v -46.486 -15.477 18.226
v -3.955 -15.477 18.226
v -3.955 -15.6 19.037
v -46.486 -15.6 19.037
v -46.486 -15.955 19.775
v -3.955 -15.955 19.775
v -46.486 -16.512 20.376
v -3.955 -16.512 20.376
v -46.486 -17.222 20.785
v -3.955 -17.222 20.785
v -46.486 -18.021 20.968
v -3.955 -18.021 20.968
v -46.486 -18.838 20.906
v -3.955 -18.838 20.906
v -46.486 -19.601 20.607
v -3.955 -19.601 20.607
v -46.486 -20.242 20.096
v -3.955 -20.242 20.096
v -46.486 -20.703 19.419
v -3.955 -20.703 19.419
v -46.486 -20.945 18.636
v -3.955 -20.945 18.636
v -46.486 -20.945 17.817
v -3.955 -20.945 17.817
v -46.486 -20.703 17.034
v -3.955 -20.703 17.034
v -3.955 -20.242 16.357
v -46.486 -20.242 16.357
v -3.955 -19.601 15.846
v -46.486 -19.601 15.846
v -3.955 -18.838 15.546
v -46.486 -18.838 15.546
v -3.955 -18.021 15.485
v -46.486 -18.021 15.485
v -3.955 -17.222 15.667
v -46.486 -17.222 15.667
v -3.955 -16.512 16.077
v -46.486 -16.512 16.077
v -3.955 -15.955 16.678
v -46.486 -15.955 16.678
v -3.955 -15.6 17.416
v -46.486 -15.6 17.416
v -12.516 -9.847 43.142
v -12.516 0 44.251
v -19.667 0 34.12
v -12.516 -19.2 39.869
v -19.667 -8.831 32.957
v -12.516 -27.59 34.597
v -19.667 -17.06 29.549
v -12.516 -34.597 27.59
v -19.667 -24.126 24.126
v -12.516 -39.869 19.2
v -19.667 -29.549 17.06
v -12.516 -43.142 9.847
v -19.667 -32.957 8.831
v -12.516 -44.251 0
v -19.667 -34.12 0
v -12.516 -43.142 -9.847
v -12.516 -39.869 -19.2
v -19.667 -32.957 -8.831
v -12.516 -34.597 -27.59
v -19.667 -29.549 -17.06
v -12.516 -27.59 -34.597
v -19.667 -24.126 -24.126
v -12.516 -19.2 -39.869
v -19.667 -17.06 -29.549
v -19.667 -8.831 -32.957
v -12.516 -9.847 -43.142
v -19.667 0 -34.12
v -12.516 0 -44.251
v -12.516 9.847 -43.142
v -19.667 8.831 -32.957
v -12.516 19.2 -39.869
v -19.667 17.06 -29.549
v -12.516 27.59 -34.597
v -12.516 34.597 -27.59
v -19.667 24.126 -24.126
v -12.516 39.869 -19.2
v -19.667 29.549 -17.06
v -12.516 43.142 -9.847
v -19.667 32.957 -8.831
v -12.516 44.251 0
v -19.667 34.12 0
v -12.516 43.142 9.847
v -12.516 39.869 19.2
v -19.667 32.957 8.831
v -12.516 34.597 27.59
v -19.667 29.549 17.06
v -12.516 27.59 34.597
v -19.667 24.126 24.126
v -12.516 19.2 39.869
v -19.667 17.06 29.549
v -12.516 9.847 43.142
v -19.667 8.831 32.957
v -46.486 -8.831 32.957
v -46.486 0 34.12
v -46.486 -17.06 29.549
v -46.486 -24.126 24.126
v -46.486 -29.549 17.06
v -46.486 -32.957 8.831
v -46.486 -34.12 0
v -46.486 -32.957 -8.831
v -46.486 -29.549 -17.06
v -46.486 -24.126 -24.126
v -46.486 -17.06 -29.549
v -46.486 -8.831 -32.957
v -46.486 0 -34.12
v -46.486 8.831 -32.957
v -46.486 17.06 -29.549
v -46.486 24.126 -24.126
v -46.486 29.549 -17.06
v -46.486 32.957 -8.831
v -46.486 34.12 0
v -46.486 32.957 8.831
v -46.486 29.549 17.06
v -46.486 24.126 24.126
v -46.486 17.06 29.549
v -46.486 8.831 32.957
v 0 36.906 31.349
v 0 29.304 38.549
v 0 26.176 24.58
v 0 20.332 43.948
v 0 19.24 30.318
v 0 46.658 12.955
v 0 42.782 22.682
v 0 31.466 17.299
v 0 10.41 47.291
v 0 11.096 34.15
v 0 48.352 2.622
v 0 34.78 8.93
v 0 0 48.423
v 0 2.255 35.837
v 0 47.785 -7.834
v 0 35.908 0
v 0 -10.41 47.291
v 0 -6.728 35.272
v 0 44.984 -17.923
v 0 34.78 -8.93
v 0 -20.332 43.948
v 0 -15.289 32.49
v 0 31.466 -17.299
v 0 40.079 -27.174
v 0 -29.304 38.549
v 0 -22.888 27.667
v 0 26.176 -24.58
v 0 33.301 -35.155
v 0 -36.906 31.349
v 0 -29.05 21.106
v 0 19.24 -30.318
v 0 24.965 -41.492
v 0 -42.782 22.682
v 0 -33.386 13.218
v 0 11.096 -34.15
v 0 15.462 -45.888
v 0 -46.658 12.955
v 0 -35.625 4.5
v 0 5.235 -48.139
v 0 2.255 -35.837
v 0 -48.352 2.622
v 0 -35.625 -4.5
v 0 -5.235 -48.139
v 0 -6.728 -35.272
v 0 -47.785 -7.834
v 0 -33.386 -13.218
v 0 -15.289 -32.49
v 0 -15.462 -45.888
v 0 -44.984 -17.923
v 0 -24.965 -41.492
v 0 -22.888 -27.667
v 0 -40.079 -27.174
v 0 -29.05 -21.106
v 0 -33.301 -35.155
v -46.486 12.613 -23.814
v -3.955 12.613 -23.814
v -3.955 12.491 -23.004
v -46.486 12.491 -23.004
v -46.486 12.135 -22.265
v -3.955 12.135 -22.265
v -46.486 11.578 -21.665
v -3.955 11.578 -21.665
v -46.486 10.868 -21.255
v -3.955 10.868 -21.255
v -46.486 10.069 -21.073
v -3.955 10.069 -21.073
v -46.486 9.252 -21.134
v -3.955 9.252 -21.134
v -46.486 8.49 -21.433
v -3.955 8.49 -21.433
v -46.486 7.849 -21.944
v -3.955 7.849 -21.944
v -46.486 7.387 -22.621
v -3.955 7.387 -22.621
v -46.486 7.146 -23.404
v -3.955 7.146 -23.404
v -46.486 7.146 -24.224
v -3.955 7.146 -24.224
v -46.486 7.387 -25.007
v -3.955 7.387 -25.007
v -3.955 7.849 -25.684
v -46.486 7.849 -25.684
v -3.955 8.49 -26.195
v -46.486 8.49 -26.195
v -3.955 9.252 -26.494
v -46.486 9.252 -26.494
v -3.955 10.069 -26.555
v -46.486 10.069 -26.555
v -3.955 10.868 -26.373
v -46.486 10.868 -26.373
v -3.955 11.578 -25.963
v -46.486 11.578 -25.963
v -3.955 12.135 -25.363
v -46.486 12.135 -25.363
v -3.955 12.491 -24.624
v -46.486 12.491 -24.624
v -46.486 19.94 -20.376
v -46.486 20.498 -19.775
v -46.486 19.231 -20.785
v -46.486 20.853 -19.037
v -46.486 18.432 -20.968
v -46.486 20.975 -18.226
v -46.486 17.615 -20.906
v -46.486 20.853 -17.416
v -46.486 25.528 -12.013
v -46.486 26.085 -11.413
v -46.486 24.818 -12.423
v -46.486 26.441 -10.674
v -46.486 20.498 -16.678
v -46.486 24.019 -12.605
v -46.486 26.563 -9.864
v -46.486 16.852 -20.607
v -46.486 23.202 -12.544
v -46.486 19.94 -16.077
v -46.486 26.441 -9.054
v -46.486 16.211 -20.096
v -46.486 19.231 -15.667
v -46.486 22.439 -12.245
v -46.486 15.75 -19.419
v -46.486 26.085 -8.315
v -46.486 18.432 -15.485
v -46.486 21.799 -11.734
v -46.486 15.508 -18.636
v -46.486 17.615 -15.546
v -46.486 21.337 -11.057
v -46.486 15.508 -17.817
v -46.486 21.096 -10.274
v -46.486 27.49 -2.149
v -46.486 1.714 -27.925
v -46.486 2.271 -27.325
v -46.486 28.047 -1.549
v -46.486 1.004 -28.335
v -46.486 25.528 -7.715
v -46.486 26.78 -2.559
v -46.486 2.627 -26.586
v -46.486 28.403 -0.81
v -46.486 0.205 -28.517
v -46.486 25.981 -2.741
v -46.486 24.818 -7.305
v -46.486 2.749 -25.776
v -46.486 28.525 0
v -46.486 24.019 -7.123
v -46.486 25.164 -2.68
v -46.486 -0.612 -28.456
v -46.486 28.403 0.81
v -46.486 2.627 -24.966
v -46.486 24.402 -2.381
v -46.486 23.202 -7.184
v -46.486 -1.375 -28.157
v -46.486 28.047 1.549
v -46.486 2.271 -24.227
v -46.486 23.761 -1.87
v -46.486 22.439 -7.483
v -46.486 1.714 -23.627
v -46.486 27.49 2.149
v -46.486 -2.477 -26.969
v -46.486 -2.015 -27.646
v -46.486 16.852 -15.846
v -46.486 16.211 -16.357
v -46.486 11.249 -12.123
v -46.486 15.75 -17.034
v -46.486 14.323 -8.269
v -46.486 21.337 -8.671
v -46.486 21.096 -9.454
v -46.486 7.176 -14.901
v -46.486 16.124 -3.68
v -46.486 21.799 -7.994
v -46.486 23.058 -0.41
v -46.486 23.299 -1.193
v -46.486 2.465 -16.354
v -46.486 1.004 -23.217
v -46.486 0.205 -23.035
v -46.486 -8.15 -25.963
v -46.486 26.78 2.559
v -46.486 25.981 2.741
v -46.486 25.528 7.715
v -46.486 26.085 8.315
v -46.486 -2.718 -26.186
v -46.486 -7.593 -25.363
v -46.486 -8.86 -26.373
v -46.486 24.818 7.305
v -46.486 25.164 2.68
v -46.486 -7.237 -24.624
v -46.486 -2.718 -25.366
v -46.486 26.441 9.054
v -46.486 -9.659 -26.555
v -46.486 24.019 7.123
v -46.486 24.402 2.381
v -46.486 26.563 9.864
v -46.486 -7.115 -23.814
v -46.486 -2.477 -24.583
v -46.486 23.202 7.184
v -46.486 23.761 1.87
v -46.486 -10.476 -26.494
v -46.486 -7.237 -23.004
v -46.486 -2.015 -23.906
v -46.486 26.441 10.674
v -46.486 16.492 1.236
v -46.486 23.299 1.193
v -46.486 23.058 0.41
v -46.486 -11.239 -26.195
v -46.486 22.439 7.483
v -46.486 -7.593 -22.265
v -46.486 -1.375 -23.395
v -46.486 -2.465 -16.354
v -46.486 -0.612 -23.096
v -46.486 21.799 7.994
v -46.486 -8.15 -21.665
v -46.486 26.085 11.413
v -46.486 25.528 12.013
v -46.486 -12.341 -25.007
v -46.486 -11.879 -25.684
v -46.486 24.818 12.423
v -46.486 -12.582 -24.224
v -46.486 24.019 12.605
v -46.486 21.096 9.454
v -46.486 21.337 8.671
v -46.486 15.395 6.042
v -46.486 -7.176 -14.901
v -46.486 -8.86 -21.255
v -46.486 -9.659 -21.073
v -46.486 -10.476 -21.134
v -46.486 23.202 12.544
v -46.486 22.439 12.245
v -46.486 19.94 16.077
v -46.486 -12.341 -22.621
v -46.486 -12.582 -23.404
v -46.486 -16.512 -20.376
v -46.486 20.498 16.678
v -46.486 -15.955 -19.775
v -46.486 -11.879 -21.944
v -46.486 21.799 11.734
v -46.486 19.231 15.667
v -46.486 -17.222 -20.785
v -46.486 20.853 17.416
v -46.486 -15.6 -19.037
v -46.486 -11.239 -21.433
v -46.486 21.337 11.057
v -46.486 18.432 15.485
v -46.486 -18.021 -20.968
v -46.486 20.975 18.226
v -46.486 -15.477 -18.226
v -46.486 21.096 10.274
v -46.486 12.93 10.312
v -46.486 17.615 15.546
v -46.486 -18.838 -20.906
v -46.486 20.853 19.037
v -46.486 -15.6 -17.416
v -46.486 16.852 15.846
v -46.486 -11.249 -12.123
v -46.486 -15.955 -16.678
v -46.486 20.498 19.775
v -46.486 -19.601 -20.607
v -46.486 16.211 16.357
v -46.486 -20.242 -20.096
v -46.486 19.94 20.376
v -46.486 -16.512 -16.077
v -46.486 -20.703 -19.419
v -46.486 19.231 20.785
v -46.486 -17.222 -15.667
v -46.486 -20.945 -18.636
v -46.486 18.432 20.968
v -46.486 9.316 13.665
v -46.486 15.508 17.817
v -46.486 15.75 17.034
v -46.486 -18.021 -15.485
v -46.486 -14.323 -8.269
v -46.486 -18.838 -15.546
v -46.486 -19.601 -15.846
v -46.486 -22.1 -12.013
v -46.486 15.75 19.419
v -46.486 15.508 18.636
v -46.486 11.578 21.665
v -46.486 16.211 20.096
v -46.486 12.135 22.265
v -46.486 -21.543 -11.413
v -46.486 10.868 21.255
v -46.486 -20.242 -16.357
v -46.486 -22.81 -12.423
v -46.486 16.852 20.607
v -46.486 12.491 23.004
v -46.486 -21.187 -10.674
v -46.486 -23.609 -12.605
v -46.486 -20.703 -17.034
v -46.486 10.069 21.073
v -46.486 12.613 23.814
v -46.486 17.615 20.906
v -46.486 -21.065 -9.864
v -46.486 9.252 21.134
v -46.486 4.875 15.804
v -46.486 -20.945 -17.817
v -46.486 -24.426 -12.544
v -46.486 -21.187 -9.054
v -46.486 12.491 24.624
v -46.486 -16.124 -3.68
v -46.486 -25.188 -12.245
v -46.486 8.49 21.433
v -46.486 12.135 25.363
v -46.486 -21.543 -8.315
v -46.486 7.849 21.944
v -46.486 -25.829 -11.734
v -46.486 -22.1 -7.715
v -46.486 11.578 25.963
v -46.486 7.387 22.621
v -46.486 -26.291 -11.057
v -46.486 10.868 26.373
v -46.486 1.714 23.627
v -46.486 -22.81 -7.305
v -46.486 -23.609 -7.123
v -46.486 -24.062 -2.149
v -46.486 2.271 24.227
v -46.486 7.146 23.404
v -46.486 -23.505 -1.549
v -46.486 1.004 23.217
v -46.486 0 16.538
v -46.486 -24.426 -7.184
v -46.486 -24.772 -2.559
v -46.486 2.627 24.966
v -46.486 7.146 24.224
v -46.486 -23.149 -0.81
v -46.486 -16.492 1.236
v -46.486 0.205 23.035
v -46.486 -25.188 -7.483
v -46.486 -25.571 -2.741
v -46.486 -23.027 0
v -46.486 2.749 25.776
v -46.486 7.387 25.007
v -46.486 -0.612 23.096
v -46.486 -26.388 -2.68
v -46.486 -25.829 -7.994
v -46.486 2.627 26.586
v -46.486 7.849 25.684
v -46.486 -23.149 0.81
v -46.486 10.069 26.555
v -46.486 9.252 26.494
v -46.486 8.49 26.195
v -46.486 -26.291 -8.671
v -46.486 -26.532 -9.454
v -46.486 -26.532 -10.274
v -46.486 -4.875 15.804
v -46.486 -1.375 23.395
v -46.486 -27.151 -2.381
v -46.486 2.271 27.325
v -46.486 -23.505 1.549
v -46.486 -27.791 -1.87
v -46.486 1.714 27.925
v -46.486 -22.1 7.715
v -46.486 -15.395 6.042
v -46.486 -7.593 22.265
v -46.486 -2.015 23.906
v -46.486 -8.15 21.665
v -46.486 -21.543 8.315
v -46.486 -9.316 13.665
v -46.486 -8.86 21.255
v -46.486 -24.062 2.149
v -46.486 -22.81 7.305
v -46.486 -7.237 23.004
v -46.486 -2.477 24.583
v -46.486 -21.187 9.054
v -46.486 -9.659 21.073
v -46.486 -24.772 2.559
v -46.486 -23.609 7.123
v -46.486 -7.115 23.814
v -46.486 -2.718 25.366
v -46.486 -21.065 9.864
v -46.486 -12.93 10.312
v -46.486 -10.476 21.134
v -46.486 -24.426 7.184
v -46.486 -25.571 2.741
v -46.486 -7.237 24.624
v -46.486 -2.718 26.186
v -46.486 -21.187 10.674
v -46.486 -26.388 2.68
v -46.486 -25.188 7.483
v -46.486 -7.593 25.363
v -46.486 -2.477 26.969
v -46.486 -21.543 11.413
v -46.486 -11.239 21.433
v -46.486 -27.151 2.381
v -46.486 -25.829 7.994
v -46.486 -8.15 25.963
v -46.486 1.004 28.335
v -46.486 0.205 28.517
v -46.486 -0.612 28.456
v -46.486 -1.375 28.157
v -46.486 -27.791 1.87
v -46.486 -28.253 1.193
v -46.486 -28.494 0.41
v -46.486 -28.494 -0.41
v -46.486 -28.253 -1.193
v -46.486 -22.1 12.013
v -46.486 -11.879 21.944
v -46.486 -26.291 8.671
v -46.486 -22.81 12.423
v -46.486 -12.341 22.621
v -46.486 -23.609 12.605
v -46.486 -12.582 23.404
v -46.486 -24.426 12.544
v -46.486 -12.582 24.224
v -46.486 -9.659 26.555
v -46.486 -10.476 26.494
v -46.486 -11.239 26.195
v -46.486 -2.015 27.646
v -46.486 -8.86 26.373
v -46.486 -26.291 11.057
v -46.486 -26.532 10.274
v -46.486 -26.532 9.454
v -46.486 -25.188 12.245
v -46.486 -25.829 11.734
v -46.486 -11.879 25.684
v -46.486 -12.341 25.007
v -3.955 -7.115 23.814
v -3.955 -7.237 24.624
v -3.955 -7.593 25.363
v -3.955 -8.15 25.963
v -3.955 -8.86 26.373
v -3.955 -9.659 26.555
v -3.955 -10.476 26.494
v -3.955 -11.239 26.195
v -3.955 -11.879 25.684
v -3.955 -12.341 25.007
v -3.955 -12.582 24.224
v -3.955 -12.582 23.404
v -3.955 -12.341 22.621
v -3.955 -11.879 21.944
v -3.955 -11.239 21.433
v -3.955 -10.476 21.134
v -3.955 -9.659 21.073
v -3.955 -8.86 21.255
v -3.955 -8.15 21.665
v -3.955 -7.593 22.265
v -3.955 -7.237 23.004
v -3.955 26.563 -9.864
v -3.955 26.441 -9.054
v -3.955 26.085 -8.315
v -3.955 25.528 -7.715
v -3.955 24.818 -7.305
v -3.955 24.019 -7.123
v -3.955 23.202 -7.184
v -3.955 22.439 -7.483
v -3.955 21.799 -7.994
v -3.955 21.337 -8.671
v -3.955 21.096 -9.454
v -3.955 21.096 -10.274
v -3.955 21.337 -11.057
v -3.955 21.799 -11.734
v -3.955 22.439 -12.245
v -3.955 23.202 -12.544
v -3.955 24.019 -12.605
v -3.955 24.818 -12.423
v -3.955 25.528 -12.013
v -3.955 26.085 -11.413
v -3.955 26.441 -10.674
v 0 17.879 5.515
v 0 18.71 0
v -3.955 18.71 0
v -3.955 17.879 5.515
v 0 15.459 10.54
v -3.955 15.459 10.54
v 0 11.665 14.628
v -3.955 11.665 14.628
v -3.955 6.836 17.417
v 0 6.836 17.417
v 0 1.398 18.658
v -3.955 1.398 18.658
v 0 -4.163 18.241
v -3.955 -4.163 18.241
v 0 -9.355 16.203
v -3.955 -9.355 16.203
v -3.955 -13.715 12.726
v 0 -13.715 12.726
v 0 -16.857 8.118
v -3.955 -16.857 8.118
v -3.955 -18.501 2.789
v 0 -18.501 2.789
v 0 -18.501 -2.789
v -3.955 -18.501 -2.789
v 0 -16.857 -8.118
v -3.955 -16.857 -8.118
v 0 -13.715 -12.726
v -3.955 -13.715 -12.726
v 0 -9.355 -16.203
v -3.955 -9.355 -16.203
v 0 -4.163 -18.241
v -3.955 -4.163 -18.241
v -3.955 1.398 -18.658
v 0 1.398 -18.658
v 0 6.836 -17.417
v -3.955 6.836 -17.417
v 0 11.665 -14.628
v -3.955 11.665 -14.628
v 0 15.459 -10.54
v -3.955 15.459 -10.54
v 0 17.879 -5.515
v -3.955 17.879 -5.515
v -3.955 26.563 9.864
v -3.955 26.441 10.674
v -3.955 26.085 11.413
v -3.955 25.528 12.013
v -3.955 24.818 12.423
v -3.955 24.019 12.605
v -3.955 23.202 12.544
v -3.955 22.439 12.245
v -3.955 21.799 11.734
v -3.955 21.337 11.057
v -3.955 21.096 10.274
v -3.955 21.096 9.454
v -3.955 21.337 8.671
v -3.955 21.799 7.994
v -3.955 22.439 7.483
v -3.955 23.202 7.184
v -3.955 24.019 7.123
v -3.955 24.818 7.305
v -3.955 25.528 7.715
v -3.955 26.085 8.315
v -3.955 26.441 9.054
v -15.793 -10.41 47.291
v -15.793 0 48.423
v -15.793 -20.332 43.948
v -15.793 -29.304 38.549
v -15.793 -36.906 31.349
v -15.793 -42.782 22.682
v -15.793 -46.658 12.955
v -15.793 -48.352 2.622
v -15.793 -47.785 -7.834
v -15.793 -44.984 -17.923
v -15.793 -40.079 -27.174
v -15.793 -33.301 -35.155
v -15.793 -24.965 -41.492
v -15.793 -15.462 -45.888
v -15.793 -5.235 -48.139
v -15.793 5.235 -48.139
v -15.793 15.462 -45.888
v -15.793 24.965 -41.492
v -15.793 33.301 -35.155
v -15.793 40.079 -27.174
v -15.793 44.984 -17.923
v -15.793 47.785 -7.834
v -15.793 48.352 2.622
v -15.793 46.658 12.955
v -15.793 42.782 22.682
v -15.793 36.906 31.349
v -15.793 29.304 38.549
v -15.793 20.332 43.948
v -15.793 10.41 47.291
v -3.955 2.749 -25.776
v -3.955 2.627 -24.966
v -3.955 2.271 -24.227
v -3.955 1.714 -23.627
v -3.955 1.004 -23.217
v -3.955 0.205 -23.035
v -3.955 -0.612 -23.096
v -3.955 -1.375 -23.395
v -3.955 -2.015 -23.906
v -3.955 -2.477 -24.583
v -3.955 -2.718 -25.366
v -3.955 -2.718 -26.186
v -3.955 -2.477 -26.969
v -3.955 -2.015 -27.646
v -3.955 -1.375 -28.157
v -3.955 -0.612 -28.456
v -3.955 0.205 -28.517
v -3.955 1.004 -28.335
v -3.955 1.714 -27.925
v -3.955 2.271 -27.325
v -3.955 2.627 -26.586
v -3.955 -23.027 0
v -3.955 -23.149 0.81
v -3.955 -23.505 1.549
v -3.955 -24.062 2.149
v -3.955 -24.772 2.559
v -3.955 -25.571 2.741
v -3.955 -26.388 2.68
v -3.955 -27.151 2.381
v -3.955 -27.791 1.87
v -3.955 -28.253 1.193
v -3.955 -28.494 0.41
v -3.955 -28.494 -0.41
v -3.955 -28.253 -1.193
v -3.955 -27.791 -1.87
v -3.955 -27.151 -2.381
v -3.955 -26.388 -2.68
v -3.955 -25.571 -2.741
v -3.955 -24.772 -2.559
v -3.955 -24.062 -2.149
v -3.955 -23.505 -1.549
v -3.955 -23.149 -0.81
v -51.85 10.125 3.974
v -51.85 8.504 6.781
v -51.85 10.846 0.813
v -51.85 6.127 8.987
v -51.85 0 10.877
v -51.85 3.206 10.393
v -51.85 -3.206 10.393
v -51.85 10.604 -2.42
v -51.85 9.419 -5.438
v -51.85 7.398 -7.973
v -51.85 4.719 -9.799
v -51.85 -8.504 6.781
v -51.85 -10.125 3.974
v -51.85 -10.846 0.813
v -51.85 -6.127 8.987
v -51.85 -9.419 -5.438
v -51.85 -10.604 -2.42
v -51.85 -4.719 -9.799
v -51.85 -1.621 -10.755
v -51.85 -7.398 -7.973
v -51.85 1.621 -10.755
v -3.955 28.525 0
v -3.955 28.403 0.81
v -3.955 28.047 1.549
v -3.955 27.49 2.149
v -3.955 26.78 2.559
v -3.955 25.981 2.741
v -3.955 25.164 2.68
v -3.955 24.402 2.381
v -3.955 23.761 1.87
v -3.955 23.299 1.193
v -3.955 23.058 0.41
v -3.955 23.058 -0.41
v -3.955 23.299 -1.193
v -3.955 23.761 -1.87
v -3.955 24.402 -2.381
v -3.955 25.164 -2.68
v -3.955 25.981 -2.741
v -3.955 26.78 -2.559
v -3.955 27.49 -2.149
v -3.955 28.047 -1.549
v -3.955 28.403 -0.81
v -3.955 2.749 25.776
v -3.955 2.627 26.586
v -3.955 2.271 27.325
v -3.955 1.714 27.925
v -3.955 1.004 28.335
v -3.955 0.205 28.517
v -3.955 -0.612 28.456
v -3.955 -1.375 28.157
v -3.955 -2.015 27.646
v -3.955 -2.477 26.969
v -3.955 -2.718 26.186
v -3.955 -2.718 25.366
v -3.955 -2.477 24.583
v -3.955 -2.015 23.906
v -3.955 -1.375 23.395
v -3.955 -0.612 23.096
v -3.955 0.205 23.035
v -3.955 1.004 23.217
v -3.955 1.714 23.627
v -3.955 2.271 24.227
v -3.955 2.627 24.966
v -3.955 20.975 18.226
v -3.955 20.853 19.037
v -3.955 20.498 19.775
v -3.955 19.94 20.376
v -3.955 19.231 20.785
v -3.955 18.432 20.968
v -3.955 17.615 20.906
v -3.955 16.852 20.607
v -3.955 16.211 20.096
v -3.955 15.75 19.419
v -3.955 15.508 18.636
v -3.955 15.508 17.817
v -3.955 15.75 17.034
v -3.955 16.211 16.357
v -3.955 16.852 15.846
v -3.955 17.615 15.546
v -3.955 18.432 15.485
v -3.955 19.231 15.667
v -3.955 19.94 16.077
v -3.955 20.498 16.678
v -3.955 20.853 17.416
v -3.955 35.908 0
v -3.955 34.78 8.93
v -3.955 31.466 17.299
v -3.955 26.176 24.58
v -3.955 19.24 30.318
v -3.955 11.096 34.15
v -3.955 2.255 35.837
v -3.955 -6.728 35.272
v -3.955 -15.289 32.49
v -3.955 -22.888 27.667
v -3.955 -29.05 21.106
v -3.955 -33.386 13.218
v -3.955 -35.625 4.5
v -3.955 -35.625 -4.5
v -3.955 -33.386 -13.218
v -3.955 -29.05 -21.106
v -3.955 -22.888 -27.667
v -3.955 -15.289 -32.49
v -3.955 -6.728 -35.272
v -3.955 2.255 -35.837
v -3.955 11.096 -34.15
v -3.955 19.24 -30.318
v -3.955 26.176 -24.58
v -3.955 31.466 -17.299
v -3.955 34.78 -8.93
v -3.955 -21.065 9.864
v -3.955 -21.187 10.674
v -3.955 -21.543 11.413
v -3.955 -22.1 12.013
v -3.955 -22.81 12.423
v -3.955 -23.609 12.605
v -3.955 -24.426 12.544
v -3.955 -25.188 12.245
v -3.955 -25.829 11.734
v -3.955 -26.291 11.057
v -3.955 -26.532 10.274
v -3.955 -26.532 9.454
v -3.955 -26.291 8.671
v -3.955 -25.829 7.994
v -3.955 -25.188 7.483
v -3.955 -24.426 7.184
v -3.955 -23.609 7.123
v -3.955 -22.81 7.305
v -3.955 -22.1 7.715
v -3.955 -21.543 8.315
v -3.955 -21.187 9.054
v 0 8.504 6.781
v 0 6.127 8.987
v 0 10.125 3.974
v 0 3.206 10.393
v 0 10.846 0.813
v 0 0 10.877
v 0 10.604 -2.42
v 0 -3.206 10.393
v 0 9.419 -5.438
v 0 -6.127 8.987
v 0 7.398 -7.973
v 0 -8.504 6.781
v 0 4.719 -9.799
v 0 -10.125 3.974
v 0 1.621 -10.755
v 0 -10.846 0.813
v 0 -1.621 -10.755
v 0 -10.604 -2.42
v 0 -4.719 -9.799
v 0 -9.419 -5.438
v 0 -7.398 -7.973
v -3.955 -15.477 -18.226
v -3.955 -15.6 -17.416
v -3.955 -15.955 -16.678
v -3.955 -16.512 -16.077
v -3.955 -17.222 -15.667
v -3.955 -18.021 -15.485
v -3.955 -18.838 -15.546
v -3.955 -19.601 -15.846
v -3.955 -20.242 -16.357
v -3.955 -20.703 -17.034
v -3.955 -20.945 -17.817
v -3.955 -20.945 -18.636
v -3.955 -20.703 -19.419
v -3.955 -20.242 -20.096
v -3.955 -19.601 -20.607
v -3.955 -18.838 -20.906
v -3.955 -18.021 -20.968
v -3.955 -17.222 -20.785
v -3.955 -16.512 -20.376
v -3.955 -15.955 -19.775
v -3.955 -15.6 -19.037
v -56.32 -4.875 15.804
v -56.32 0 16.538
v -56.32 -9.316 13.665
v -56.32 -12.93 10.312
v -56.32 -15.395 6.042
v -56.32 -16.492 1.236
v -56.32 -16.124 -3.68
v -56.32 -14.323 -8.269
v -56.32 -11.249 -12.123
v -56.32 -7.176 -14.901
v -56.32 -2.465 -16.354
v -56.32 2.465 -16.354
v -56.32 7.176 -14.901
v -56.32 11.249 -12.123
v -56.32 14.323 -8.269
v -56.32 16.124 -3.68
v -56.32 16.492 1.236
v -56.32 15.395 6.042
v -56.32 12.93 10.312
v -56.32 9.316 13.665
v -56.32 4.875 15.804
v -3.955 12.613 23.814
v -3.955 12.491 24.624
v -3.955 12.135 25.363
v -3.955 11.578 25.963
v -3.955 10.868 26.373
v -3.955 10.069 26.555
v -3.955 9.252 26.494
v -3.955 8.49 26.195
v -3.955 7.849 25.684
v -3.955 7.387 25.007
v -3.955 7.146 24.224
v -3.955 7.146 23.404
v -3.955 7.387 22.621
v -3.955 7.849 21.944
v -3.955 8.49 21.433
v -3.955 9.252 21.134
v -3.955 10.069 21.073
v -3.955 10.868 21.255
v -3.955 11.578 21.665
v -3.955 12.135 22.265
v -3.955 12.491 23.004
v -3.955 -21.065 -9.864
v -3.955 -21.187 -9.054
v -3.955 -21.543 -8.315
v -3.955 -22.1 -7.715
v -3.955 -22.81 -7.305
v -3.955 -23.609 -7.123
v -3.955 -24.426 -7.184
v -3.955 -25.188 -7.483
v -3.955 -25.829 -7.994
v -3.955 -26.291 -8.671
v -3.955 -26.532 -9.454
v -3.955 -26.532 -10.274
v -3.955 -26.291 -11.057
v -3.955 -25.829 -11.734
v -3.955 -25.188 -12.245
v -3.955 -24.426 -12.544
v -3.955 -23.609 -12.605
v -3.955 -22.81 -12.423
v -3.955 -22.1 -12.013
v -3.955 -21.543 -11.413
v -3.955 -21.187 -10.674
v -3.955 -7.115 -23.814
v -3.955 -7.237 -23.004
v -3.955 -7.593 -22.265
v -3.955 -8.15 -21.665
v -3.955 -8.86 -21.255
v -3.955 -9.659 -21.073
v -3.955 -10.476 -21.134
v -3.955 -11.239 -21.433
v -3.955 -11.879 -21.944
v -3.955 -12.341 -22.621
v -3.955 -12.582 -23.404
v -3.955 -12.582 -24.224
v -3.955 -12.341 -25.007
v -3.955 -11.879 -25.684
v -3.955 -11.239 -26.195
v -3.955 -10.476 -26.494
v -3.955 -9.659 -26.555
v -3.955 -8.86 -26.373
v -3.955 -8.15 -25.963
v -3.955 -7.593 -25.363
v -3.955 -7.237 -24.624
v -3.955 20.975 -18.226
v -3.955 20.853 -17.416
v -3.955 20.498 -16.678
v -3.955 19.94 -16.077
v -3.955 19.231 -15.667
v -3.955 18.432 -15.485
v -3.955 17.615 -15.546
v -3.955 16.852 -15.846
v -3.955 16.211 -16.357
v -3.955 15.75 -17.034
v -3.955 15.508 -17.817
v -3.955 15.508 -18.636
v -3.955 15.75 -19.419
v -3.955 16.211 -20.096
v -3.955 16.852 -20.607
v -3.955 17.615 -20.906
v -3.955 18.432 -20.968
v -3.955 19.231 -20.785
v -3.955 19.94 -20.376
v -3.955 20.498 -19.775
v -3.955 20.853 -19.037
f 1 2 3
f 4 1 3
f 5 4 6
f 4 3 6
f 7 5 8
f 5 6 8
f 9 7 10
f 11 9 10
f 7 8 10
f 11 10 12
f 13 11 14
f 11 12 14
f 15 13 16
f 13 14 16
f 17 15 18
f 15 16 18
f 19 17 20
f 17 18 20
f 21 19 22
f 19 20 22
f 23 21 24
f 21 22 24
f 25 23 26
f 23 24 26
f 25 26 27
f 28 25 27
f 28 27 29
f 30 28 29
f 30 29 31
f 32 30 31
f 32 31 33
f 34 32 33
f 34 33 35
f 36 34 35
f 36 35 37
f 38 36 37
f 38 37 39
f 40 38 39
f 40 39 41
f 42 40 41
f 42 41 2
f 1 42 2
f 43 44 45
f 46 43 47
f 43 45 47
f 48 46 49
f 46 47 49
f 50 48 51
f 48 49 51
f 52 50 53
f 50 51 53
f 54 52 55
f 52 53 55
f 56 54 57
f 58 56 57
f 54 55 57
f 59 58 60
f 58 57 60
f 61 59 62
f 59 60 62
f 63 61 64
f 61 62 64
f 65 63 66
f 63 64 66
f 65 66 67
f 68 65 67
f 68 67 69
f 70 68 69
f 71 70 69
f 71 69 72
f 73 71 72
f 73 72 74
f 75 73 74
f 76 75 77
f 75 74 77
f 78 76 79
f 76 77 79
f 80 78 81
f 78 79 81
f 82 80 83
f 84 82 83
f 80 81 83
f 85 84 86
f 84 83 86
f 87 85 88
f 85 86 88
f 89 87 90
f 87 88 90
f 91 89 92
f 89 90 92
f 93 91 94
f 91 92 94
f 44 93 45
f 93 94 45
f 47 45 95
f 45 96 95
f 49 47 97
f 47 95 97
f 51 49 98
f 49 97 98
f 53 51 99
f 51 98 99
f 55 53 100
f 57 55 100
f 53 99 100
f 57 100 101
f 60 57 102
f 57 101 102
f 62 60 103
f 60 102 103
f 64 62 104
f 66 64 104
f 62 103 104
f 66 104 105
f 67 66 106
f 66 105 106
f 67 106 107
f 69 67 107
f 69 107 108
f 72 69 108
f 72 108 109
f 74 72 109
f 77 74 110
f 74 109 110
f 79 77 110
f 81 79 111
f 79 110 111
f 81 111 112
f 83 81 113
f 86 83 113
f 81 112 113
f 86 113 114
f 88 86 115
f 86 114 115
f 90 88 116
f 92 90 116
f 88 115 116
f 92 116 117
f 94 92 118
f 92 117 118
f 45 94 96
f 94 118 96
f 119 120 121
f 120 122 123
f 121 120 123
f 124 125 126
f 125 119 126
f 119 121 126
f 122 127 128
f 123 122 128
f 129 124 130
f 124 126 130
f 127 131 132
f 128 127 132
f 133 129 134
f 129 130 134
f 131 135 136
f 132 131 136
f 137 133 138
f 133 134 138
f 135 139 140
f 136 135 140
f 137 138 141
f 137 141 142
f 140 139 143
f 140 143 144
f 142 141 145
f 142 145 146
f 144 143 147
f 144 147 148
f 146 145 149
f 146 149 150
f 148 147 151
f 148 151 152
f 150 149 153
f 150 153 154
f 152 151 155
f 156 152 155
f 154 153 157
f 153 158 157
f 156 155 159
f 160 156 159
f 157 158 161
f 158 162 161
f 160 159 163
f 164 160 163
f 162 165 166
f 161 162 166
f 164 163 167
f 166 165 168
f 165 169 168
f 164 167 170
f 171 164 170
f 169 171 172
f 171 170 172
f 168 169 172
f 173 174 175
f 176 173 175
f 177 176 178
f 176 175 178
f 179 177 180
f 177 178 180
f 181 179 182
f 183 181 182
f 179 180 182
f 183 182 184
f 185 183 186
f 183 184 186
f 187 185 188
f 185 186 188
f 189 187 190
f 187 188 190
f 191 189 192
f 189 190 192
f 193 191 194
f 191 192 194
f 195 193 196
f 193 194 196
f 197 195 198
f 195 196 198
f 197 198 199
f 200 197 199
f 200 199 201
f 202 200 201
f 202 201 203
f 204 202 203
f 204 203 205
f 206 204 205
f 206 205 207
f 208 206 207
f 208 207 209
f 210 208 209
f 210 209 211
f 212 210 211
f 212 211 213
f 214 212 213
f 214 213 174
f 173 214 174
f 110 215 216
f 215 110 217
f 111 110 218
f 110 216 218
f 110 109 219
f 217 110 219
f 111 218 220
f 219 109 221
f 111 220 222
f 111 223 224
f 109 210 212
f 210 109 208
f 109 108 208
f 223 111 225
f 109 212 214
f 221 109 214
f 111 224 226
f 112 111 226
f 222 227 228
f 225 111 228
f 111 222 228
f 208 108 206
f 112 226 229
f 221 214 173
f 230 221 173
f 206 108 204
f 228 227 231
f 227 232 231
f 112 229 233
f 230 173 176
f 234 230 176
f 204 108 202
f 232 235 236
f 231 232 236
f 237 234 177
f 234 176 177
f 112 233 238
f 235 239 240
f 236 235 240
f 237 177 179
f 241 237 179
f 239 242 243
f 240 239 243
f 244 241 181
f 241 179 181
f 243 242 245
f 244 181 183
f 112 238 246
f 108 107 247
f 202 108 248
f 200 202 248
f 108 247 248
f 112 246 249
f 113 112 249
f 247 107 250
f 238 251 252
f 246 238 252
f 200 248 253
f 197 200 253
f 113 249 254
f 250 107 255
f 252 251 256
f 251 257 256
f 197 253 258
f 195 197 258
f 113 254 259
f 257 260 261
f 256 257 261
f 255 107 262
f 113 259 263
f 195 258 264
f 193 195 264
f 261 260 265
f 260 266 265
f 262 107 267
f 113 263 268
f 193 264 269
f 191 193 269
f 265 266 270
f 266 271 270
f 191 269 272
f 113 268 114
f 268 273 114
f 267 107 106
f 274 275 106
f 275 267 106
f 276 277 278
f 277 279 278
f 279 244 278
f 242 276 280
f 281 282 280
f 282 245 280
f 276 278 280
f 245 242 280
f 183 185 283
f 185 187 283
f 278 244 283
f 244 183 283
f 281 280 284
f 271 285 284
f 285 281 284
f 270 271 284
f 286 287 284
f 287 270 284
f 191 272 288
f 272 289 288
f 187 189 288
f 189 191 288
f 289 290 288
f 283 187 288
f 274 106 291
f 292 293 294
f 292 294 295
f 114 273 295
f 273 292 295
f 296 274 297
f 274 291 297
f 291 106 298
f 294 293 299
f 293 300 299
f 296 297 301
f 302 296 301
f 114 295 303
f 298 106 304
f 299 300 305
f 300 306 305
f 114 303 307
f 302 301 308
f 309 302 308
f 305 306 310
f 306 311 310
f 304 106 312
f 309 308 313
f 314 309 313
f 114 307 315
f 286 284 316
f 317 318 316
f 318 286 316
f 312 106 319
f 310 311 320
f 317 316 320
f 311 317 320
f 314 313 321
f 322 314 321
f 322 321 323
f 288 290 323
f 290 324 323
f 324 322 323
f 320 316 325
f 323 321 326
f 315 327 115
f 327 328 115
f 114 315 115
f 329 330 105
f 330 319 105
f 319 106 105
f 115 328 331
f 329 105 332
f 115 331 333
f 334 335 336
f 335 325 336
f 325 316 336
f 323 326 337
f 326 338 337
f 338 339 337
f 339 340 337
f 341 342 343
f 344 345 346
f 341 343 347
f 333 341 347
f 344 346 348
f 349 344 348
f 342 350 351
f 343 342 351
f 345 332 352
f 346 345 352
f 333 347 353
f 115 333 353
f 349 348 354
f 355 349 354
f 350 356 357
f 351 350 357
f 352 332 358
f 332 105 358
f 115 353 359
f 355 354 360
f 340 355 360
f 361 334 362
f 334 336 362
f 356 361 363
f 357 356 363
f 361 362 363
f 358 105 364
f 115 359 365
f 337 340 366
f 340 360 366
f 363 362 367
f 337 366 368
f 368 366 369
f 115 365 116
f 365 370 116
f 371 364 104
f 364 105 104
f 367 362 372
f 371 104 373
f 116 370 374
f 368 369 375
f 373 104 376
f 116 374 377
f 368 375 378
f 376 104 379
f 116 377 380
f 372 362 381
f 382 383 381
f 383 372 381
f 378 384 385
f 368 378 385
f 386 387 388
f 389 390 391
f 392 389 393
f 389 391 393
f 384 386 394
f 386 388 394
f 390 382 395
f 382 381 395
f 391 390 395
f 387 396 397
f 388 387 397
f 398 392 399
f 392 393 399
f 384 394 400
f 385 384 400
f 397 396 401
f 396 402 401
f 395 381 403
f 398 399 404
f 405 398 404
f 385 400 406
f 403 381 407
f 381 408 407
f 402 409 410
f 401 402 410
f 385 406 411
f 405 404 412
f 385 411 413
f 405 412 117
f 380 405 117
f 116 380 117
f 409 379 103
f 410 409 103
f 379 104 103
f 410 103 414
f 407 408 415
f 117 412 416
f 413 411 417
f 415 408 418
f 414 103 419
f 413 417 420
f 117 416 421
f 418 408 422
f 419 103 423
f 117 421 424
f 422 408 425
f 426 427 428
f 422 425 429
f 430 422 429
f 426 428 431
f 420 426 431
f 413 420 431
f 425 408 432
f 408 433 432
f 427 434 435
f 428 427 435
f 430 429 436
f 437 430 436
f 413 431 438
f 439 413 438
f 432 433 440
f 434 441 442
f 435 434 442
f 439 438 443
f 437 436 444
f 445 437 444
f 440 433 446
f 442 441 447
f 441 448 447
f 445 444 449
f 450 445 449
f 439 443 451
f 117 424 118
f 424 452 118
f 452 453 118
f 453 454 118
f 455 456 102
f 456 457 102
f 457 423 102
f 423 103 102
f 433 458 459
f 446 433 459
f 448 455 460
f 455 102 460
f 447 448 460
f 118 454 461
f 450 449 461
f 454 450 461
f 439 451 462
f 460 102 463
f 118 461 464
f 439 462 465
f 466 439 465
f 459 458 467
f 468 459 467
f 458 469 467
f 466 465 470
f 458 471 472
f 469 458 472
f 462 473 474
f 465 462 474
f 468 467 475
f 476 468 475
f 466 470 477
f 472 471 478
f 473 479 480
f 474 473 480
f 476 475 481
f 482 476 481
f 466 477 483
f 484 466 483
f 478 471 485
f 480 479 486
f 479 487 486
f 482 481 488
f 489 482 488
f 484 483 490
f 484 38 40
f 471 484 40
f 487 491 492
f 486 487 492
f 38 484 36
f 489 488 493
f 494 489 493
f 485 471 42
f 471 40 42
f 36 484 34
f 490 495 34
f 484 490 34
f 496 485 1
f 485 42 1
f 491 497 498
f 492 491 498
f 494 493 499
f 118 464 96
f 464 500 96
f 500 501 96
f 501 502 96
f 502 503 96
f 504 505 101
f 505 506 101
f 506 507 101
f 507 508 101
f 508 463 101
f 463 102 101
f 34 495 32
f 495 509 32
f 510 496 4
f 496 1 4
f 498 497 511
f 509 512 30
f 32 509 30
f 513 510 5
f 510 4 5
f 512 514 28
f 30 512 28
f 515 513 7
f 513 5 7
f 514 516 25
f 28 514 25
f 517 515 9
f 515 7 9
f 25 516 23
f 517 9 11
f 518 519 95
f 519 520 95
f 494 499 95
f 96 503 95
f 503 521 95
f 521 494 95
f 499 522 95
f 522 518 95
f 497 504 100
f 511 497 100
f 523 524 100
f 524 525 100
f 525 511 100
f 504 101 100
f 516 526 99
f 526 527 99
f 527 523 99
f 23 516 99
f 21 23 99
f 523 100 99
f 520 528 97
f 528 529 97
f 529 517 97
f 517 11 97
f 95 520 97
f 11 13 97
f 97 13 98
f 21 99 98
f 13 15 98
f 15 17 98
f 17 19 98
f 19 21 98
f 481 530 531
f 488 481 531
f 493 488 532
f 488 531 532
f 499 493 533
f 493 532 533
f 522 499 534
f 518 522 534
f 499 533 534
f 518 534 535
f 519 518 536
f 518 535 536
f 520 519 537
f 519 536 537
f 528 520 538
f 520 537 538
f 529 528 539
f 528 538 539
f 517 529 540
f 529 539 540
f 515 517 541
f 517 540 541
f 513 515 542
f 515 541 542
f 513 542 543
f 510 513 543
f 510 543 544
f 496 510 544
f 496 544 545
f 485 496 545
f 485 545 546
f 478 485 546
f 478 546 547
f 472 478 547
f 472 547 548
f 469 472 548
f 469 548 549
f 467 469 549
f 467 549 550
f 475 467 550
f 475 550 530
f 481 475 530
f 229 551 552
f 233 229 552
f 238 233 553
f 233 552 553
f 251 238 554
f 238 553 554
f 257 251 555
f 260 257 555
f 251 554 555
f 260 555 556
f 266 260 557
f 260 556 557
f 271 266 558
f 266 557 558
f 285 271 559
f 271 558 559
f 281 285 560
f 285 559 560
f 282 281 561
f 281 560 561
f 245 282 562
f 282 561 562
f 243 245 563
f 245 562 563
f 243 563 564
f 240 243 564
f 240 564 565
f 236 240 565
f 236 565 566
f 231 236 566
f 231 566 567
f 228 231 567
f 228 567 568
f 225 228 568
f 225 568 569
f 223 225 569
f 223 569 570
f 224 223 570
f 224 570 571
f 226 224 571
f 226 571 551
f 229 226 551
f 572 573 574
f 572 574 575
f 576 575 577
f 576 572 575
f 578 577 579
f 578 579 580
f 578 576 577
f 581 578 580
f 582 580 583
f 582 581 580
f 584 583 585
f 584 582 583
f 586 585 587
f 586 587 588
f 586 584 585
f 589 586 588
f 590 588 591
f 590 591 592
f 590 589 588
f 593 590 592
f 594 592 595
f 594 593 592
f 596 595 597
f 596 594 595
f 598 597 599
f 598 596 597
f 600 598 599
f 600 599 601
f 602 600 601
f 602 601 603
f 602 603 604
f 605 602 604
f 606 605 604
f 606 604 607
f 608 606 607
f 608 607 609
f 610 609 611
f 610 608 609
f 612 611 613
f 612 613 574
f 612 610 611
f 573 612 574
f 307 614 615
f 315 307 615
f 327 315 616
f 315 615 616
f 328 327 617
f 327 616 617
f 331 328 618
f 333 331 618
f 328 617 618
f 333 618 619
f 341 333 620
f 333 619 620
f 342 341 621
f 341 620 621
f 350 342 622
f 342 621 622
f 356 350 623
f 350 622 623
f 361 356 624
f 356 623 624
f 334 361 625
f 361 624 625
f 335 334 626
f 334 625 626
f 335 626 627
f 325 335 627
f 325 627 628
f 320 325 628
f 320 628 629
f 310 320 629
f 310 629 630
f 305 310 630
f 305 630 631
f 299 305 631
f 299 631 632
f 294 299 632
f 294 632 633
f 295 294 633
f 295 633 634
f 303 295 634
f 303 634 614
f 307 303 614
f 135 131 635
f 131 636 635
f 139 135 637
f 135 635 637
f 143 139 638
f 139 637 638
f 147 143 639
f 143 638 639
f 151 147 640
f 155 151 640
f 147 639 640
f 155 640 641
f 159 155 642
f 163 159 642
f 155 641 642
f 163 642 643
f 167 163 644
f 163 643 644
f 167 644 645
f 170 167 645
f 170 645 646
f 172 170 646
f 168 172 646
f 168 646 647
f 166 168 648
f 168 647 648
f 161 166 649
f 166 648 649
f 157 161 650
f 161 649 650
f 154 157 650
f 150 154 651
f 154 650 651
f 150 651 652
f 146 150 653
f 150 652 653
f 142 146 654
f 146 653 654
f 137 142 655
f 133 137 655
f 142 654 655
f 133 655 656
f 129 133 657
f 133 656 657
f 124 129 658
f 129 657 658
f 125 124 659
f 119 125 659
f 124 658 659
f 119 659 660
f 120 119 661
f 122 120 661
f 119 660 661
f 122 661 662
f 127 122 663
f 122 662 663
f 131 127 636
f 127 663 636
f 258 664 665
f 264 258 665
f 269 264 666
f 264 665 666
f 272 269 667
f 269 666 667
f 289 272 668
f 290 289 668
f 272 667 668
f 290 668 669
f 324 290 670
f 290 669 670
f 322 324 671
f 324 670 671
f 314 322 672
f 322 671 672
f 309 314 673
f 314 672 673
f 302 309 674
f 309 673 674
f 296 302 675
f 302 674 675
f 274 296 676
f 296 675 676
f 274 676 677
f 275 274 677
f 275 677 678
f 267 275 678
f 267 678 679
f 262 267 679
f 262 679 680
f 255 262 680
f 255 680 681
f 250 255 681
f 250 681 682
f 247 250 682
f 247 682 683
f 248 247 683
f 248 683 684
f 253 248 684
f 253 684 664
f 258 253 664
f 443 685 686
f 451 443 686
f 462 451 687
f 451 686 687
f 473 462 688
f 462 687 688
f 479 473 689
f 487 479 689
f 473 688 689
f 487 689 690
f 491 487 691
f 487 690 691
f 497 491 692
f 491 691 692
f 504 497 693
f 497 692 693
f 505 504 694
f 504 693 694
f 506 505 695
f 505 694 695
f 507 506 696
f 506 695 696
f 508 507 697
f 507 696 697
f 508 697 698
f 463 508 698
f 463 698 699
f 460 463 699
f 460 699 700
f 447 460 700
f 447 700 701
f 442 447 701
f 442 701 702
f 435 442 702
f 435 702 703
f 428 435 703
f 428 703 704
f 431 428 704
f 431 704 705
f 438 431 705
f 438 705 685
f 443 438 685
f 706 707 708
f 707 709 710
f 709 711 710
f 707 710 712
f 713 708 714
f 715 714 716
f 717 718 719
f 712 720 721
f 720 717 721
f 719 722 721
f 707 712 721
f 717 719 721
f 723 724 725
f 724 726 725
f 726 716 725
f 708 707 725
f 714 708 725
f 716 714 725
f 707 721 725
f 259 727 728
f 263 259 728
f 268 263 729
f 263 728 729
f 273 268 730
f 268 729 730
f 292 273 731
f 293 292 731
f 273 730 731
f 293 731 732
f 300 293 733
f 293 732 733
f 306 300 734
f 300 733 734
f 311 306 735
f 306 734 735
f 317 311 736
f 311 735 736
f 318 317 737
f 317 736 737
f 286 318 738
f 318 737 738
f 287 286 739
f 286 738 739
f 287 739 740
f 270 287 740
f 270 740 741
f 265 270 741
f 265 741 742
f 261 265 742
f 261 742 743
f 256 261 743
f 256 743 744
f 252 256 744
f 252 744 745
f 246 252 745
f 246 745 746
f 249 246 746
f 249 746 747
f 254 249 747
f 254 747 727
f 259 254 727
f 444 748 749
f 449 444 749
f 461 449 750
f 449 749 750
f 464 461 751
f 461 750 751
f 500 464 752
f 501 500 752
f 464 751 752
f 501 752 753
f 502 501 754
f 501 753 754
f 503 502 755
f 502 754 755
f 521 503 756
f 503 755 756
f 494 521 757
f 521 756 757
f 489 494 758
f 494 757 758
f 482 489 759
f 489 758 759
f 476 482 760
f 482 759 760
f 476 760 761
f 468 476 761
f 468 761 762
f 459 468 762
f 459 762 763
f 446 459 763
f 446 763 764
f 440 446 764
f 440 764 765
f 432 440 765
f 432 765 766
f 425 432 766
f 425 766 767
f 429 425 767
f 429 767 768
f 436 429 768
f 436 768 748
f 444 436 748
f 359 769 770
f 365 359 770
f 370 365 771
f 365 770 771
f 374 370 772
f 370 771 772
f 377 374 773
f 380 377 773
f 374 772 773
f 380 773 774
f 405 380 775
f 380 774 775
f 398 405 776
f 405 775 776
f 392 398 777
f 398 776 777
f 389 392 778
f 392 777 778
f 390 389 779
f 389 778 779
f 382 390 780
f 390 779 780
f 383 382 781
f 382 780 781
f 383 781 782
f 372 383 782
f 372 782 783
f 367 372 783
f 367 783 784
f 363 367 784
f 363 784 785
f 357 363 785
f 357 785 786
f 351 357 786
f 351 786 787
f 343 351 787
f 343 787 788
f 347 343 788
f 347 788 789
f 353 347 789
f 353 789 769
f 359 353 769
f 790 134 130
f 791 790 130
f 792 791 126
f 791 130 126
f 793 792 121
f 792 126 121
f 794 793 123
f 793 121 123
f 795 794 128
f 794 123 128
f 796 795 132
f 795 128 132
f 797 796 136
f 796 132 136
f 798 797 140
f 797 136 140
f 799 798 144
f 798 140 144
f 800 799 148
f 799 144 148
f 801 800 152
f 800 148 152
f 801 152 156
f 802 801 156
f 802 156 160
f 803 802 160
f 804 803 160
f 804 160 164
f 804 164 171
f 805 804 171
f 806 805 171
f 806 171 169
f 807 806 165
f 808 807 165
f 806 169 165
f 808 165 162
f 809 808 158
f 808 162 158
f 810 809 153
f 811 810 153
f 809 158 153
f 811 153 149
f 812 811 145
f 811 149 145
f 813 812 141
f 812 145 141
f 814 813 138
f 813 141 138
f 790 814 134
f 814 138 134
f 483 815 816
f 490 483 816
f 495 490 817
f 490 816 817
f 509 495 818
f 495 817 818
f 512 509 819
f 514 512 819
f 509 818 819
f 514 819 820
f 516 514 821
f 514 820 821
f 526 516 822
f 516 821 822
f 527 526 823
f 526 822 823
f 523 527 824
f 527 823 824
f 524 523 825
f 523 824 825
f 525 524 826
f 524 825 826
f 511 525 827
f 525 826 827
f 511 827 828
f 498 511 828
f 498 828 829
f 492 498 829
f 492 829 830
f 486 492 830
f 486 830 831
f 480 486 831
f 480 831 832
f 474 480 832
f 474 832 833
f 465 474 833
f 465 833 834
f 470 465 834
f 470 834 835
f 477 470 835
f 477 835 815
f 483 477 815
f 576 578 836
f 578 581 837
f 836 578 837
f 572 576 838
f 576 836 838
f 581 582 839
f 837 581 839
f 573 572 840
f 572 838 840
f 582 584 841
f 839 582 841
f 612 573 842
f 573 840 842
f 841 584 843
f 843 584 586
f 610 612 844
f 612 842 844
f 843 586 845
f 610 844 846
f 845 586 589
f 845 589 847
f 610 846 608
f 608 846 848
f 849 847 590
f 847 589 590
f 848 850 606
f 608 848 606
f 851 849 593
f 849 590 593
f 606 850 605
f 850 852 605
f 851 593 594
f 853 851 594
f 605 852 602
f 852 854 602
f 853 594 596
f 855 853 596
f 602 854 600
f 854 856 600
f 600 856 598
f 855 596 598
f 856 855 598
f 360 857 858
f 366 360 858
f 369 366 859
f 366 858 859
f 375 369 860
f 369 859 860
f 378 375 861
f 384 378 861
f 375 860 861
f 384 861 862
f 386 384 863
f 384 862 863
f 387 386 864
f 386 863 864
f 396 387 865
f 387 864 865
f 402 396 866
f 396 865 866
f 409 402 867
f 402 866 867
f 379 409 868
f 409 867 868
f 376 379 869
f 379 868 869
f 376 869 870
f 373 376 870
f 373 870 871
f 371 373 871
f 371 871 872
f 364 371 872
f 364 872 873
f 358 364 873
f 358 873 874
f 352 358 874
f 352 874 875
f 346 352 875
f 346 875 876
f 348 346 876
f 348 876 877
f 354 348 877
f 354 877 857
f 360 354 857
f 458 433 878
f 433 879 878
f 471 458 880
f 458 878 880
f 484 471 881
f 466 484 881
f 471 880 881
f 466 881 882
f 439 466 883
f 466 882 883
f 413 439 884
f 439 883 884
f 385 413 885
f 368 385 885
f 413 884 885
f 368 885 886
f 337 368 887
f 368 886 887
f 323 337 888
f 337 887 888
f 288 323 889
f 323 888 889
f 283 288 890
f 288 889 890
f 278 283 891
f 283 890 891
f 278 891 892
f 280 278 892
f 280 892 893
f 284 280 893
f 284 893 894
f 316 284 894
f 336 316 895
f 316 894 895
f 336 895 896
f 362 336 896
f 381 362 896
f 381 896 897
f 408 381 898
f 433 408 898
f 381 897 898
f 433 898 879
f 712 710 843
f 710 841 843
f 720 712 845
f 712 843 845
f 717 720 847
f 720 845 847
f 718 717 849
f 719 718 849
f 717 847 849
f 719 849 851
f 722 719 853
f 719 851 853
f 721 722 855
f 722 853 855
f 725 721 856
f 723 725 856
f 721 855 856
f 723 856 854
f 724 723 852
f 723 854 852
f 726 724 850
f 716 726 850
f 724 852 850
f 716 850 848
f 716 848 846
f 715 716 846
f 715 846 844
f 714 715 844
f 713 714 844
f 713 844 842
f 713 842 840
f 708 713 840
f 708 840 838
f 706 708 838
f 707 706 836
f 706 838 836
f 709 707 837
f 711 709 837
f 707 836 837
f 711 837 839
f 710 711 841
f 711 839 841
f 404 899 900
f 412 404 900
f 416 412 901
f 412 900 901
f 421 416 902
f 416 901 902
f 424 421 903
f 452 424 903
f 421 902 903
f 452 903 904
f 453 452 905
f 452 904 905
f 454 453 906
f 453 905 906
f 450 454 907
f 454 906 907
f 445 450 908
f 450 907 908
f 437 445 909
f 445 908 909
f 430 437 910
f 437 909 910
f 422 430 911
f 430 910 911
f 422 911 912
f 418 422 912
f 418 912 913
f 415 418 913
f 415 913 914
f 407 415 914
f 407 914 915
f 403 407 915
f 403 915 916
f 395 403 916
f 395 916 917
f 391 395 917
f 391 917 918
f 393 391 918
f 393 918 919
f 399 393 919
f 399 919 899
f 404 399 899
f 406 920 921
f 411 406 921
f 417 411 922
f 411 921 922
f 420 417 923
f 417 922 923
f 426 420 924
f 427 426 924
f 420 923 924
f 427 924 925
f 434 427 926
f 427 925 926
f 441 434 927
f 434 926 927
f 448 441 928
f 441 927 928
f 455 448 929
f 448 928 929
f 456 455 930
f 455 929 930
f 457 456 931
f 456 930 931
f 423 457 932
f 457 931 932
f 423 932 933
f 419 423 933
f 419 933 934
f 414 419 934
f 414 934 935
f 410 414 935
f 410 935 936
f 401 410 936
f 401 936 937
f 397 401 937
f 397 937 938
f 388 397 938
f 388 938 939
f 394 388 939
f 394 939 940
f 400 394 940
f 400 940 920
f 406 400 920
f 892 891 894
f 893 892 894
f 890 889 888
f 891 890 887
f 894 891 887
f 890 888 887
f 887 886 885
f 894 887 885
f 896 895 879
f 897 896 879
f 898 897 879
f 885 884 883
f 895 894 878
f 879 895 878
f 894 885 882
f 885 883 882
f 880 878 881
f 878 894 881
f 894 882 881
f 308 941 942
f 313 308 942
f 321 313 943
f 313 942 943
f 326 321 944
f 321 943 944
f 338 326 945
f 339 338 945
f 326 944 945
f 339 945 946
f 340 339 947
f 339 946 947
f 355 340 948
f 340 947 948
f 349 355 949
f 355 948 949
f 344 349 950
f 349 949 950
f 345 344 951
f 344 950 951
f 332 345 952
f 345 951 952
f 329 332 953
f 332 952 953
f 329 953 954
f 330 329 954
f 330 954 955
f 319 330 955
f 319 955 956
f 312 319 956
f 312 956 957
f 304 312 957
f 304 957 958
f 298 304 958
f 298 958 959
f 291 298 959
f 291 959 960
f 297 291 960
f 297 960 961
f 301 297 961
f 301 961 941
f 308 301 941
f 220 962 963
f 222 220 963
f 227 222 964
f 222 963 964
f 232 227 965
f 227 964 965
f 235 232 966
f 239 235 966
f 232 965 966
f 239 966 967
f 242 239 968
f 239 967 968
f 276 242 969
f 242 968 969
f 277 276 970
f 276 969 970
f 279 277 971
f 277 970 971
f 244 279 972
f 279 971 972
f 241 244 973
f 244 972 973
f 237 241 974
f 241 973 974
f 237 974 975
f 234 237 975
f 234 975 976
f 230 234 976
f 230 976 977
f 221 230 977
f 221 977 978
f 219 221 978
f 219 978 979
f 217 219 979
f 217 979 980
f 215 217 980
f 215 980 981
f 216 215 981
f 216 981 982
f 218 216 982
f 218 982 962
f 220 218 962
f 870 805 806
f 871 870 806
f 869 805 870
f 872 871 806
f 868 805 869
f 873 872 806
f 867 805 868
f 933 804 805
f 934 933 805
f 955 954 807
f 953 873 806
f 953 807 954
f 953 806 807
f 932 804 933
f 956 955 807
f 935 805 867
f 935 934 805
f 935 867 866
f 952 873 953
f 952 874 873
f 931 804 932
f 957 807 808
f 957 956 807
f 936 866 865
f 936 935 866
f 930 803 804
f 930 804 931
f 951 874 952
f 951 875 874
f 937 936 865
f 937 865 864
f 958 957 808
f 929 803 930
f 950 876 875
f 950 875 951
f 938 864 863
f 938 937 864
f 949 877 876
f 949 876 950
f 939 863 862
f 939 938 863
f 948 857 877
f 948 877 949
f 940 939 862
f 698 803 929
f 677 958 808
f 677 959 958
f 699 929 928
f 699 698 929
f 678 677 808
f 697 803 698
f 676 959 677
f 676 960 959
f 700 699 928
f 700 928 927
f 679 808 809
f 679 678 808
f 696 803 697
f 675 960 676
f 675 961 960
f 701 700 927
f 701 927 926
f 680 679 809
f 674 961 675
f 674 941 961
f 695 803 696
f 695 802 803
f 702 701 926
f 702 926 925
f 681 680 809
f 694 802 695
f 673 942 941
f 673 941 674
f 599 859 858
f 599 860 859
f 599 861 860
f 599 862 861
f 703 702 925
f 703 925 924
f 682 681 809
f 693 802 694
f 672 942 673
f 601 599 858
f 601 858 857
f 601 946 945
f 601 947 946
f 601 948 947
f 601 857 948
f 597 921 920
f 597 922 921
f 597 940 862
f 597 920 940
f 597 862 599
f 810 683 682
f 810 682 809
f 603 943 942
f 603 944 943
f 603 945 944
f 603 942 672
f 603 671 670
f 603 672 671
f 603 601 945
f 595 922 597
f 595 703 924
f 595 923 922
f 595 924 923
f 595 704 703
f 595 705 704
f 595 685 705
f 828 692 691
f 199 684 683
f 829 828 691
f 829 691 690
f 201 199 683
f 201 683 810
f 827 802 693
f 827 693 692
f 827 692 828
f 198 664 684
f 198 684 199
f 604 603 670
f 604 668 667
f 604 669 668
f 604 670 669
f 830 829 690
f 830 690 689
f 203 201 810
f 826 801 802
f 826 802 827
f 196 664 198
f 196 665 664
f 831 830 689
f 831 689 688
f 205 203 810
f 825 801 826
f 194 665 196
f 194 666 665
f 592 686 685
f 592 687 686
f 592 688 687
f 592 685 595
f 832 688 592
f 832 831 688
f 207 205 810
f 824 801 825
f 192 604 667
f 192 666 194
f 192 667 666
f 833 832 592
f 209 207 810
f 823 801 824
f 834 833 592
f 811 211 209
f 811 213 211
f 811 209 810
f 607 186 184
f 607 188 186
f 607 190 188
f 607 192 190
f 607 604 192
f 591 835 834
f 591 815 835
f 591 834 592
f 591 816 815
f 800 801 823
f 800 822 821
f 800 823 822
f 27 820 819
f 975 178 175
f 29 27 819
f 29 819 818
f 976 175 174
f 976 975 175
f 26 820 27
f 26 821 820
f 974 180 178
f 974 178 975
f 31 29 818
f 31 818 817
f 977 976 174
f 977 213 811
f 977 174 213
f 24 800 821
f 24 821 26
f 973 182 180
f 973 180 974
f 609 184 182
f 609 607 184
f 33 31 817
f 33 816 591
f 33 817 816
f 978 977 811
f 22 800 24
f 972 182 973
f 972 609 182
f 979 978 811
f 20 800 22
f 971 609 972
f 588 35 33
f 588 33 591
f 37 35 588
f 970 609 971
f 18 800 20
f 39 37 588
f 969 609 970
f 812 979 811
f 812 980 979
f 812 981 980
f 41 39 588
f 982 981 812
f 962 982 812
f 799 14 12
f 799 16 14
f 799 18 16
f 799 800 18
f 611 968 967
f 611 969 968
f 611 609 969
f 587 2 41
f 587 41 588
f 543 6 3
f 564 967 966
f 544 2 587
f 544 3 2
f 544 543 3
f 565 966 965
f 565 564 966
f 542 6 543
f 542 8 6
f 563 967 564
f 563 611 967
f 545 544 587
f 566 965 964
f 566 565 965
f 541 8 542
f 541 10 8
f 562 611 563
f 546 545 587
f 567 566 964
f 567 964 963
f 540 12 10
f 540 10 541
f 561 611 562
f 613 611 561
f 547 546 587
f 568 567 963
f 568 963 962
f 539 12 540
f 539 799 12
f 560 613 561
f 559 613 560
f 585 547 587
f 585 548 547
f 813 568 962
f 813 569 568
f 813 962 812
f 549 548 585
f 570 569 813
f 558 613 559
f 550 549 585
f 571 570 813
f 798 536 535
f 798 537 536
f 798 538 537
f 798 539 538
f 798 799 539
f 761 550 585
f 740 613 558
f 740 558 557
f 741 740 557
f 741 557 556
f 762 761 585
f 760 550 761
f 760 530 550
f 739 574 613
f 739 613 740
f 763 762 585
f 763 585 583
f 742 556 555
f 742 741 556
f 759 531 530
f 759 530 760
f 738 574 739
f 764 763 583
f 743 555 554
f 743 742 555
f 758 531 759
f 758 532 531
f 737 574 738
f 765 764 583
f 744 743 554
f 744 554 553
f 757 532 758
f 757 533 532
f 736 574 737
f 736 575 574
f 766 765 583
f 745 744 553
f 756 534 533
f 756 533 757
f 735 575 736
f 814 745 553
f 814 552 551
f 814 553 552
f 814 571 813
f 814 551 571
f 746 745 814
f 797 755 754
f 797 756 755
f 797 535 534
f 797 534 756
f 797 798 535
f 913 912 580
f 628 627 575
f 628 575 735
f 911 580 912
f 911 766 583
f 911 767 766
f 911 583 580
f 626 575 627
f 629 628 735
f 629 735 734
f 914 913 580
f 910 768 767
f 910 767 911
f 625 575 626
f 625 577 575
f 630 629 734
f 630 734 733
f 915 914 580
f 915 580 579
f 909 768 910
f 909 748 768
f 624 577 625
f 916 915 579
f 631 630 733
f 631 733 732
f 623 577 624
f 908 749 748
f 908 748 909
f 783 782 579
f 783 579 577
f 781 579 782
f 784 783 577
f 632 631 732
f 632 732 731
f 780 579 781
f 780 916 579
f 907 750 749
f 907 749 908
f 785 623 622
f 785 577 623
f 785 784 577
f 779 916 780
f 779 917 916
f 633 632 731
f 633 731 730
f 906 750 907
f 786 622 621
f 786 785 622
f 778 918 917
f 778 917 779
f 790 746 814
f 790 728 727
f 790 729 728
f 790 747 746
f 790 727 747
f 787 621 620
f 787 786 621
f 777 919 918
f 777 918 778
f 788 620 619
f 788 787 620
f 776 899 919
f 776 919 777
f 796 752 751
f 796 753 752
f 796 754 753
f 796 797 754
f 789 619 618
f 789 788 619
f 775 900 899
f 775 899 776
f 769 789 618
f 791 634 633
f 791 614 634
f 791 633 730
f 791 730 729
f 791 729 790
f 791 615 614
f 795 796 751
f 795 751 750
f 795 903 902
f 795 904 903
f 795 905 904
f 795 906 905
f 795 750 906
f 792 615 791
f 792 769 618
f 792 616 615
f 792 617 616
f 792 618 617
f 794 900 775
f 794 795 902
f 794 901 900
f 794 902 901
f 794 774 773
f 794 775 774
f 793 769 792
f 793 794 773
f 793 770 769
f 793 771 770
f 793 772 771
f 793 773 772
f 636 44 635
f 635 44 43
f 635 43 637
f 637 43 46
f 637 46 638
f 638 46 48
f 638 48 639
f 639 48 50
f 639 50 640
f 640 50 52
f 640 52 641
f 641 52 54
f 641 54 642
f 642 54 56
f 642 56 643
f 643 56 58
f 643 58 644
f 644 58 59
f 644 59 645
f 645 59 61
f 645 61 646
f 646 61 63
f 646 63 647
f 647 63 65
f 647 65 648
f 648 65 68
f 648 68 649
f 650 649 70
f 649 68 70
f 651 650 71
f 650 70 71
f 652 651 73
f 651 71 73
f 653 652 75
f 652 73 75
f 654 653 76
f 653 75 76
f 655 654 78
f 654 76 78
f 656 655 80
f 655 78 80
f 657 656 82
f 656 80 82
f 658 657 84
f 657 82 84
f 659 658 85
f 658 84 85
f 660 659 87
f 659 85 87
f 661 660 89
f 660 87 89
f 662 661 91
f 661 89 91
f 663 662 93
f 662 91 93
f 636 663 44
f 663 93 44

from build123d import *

# Parameters (mm, degrees)
F2_R     = 35.907652
F2_R_2   = 18.709926
F3_DEPTH = 3.95508
F4_R     = 2.749
F5_DEPTH = 47


with BuildPart() as f1:
    # F0 (on Front) → F1 (revolve)
    with BuildSketch(Plane.XZ):
        Polygon((-56.319889, 0), (-51.850058, 0), (-51.850058, 10.876591), (0, 10.876591), (0, 48.423186), (-15.793407, 48.423186), (-12.515531, 44.251341), (-19.667262, 34.119722), (-46.486259, 34.119722), (-46.486259, 16.53838), (-56.319889, 16.53838), align=None)
    revolve(axis=Axis((-0.162292, 0, 0), (1, 0, 0)))

    # F2 (on face) → F3 (cut)
    with BuildSketch(Plane.YZ):
        Circle(F2_R)
        Circle(F2_R_2, mode=Mode.SUBTRACT)
    extrude(amount=-F3_DEPTH, mode=Mode.SUBTRACT)

    # F4 (on face) → F5 (cut)
    with BuildSketch(Plane.YZ.offset(-3.95508)):
        with Locations((0, 25.776034)):
            Circle(F4_R)
        with Locations((-9.864061, 23.81395)):
            Circle(F4_R)
        with Locations((-18.226409, 18.226409)):
            Circle(F4_R)
        with Locations((-23.81395, 9.864061)):
            Circle(F4_R)
        with Locations((-25.776034, 0)):
            Circle(F4_R)
        with Locations((-23.81395, -9.864061)):
            Circle(F4_R)
        with Locations((-18.226409, -18.226409)):
            Circle(F4_R)
        with Locations((-9.864061, -23.81395)):
            Circle(F4_R)
        with Locations((0, -25.776034)):
            Circle(F4_R)
        with Locations((9.864061, -23.81395)):
            Circle(F4_R)
        with Locations((18.226409, -18.226409)):
            Circle(F4_R)
        with Locations((23.81395, -9.864061)):
            Circle(F4_R)
        with Locations((25.776034, 0)):
            Circle(F4_R)
        with Locations((23.81395, 9.864061)):
            Circle(F4_R)
        with Locations((18.226409, 18.226409)):
            Circle(F4_R)
        with Locations((9.864061, 23.81395)):
            Circle(F4_R)
    extrude(amount=-F5_DEPTH, mode=Mode.SUBTRACT)


solid = f1.part
